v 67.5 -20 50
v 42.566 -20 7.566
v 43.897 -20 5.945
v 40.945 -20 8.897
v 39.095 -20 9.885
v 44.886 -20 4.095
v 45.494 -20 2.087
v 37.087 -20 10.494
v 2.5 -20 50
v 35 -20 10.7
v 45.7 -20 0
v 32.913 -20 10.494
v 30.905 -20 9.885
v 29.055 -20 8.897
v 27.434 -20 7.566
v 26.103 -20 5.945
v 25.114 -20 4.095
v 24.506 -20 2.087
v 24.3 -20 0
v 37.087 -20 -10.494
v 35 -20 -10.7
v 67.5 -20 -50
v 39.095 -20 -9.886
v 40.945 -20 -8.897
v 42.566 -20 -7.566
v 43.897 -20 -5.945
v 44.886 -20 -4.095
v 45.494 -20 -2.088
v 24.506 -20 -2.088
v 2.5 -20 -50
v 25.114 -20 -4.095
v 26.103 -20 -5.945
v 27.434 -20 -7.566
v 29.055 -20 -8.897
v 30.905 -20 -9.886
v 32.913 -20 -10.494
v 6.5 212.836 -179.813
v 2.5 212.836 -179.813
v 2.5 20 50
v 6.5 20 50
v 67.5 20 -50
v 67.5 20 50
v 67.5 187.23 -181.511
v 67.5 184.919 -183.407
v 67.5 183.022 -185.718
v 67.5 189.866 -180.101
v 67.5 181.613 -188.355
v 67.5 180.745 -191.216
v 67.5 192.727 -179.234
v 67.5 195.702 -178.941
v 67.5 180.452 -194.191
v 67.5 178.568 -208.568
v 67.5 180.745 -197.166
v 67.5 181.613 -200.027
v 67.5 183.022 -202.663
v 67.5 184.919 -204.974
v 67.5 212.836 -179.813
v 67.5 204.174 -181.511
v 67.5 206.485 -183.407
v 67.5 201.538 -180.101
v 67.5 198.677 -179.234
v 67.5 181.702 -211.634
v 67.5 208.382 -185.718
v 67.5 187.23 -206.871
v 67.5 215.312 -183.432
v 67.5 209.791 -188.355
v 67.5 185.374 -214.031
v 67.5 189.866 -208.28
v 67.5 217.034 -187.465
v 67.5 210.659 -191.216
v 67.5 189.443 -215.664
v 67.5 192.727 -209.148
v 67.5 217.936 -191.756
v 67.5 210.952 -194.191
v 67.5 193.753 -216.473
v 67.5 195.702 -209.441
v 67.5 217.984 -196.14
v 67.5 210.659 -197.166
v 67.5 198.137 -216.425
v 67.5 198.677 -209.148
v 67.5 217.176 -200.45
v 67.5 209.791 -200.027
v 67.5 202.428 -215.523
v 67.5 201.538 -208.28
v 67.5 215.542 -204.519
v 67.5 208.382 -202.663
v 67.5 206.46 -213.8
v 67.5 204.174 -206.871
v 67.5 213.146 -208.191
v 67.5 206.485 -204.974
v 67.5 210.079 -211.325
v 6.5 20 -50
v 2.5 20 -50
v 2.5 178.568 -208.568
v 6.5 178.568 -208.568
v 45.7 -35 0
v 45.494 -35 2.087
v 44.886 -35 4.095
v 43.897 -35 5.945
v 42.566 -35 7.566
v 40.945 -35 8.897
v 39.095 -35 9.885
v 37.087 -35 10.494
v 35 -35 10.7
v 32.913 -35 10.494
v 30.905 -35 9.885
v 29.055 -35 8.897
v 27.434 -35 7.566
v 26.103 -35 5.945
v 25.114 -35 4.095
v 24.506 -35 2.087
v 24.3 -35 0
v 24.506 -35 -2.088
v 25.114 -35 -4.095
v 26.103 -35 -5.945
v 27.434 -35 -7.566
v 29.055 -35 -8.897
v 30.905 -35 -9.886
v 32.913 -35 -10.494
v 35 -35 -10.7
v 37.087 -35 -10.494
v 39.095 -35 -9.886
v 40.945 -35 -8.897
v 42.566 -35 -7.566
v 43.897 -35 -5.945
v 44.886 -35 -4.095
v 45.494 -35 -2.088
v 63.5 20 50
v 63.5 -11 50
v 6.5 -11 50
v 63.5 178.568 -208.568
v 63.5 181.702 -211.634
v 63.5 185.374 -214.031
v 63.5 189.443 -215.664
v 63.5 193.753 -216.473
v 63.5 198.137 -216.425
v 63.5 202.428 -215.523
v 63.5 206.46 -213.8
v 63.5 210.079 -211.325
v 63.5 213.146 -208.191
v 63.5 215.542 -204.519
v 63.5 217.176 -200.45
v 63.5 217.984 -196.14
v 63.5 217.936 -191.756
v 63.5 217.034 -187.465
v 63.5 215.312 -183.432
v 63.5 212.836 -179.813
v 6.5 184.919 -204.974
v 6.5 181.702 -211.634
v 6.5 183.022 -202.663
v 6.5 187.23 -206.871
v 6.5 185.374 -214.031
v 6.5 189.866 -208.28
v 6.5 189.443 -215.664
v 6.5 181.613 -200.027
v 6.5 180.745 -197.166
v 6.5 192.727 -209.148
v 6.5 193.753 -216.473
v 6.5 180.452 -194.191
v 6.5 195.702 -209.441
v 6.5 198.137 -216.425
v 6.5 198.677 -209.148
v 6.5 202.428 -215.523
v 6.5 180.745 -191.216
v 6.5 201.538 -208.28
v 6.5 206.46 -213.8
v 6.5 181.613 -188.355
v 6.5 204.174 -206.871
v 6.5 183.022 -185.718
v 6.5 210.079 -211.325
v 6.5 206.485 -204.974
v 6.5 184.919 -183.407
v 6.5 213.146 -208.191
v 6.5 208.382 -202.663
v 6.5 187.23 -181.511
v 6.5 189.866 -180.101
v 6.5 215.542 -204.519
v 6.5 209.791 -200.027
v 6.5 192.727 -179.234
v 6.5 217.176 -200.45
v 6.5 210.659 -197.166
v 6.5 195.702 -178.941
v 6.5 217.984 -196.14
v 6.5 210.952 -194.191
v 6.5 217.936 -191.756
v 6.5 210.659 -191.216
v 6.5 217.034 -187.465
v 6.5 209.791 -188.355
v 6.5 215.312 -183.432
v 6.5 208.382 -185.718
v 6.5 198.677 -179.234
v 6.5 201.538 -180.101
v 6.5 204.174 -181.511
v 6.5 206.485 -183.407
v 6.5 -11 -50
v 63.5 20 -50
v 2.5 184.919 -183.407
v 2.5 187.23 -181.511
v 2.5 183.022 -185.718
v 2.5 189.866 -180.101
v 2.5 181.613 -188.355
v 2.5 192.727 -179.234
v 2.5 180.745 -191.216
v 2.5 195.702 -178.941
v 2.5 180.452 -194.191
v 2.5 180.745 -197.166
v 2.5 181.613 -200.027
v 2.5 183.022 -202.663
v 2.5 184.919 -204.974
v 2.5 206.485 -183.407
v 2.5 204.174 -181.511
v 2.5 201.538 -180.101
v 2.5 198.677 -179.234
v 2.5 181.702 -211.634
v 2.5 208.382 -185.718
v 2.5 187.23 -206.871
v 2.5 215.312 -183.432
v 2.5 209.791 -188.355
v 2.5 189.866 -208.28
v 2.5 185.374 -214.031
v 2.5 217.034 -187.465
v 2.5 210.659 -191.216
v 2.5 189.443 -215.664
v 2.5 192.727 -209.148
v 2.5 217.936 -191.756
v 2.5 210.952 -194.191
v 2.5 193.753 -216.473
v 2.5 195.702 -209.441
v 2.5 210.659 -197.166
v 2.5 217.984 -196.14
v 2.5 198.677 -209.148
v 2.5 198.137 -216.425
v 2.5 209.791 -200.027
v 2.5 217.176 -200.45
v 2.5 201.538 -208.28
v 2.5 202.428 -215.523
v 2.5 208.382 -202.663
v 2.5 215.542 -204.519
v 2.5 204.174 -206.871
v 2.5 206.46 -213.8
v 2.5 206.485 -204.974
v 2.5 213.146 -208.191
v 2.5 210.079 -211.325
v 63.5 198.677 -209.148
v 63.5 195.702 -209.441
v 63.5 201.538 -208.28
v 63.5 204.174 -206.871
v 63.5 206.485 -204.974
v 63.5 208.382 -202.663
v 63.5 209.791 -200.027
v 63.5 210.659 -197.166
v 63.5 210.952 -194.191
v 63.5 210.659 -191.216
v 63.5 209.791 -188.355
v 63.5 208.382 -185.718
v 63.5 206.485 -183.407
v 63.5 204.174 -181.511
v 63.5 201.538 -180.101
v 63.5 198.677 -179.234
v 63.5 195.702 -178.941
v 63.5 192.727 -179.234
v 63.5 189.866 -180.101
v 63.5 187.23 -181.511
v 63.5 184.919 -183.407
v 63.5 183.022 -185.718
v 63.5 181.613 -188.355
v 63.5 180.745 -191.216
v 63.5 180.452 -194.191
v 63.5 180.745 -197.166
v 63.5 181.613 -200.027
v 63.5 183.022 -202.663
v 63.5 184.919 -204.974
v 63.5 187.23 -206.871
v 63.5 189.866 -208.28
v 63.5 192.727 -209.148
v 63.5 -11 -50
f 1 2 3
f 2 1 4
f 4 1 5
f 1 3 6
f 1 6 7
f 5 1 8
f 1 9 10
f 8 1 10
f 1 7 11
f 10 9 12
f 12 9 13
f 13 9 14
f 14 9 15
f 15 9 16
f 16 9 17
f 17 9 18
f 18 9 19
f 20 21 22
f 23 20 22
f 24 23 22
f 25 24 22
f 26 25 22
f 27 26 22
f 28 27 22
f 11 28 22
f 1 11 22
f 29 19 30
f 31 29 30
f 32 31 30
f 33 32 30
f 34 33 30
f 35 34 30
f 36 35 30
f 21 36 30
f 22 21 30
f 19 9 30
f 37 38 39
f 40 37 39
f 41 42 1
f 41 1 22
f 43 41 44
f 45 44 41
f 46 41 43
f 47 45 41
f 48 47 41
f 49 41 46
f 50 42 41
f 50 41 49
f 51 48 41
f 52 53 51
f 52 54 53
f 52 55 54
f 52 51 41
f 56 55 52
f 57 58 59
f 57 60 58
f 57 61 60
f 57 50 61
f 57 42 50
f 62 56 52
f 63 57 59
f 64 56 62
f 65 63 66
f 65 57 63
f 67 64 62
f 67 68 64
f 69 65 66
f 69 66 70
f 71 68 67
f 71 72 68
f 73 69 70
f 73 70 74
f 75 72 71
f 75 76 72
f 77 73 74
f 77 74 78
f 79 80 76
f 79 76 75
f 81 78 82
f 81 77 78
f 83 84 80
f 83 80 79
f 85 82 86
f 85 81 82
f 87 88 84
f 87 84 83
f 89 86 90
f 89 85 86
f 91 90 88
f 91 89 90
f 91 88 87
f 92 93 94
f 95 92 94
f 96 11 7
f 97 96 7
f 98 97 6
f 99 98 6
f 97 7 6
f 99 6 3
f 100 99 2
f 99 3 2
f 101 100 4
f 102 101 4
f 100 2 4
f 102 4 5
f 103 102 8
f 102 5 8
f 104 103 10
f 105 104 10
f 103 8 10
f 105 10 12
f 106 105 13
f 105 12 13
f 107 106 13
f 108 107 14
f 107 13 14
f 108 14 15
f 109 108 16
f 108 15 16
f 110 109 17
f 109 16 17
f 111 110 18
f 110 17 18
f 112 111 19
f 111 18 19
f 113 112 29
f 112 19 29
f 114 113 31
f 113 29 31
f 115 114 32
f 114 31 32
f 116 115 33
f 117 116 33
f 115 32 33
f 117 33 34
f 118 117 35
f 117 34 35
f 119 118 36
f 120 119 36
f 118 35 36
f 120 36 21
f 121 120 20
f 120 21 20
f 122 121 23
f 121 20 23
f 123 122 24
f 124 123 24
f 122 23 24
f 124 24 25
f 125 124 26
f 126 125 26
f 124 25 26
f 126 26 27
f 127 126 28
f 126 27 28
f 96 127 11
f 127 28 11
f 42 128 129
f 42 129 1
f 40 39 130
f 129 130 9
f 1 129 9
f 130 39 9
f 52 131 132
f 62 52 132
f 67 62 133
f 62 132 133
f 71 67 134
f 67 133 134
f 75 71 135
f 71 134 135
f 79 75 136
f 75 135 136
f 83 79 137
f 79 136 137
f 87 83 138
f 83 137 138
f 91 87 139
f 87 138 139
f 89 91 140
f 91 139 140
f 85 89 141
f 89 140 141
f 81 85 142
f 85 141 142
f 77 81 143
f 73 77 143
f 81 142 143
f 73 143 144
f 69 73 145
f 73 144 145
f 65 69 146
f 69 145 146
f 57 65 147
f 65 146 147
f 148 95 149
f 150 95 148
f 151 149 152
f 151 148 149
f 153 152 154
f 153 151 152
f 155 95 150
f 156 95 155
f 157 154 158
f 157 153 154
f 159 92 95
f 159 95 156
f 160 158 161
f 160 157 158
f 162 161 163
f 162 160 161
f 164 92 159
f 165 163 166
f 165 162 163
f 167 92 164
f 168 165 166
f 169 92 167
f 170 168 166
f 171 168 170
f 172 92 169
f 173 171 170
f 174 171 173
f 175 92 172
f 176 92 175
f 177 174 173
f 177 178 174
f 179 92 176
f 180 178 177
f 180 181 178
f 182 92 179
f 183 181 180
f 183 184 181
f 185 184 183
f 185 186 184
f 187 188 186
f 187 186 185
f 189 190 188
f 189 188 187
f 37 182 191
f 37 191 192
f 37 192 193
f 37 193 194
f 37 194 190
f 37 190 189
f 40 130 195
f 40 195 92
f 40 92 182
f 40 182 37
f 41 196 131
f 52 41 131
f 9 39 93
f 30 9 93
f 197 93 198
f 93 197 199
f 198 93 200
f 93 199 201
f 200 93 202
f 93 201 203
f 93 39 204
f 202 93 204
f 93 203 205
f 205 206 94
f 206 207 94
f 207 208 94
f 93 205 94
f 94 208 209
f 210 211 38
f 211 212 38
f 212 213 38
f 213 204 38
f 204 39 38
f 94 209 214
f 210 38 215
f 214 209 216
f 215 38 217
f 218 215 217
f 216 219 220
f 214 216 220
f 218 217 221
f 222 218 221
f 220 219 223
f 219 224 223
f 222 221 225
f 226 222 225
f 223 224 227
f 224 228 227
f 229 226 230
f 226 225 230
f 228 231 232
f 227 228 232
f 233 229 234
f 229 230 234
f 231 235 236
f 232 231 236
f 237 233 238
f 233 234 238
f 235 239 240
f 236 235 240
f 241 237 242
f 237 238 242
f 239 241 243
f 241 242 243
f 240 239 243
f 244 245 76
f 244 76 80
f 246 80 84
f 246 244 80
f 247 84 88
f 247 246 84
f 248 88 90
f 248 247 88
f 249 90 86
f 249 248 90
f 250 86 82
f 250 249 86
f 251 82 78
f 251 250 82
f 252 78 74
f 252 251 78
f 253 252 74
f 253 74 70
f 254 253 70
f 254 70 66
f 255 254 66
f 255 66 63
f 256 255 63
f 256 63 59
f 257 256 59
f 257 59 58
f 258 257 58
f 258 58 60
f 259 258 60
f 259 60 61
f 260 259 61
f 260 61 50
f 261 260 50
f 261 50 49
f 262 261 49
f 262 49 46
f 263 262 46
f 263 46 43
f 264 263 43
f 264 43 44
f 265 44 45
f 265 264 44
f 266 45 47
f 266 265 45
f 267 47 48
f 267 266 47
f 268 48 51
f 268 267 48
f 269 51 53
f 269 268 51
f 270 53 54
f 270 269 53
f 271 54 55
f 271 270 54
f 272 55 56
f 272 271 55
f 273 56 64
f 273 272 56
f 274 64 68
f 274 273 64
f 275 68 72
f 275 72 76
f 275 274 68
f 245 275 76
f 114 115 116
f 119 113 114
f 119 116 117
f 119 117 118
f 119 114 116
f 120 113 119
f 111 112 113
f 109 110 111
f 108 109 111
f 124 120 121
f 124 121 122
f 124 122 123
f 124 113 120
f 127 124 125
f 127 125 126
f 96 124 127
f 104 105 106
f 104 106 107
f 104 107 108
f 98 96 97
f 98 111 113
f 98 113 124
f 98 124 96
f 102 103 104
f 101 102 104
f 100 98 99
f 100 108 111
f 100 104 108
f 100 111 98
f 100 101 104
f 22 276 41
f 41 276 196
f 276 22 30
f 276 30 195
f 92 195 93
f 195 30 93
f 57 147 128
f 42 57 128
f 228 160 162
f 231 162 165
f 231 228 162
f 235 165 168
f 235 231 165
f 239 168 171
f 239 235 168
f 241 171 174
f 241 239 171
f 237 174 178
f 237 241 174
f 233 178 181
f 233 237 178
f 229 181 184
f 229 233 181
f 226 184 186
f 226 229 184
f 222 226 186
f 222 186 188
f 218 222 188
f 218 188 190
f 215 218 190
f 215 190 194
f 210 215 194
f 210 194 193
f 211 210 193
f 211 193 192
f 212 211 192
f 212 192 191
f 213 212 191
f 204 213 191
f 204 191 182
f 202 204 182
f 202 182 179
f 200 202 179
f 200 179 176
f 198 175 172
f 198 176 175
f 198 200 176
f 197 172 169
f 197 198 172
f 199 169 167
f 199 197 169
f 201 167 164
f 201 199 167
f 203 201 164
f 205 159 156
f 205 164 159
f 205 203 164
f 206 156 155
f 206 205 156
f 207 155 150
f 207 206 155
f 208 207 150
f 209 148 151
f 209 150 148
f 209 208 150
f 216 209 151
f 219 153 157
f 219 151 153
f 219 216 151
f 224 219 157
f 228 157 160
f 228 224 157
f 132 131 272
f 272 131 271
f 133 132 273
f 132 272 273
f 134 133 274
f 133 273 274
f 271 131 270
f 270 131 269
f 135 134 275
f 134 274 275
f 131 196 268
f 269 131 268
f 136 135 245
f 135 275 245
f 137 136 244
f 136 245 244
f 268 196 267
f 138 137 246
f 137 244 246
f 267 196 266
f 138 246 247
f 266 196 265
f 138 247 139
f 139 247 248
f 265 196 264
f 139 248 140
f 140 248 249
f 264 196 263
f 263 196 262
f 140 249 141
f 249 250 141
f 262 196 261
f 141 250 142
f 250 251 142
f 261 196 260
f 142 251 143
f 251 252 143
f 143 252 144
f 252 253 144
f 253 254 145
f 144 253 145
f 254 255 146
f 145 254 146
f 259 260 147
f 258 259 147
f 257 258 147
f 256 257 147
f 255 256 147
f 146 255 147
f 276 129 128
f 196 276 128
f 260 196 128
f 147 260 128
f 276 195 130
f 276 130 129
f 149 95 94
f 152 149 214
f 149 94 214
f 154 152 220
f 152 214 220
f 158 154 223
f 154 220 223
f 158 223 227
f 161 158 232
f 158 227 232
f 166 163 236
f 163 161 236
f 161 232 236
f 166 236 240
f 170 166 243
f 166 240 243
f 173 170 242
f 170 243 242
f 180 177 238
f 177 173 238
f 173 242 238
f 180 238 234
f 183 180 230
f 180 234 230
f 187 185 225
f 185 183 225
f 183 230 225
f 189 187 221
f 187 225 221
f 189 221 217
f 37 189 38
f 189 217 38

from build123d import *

# Parameters (mm, degrees)
CROQUIS1_R              = 15.25
SALIENTE_EXTRUIR2_DEPTH = 70
CROQUIS3_W              = 57
CROQUIS3_H              = 229.06918818
CORTAR_EXTRUIR1_DEPTH   = 352.435861424
CROQUIS5_R              = 10.7
SALIENTE_EXTRUIR3_DEPTH = 15
CROQUIS1_2_R            = 15.25
CORTAR_EXTRUIR2_DEPTH   = 2.5
CORTAR_EXTRUIR3_START   = -2.5
CROQUIS7_R              = 15.25
CORTAR_EXTRUIR3_DEPTH   = 2.5


with BuildPart() as part:
    # Croquis1 → Saliente-Extruir2 (new body)
    with BuildSketch(Plane(origin=(0, 0, 0), x_dir=(0, 0, -1), z_dir=(1, 0, 0))):
        with BuildLine():
            Line((50.000039636, 19.999952763), (205.563531497, 175.563444624))
            Line((205.563531497, 175.563444624), (208.567950725, 178.567863852))
            ThreePointArc((208.567950725, 178.567863852), (211.324847557, 210.079338837), (179.813372572, 212.836235669))
            Line((179.813372572, 212.836235669), (-49.999960364, 19.999952763))
            Line((-49.999960364, 19.999952763), (-49.999960364, -20.000047237))
            Line((-49.999960364, -20.000047237), (50.000039636, -20.000047237))
            Line((50.000039636, -20.000047237), (50.000039636, 19.999952763))
        make_face()
        with Locations((194.190661648, 195.702049761)):
            Circle(CROQUIS1_R, mode=Mode.SUBTRACT)
    extrude(amount=SALIENTE_EXTRUIR2_DEPTH)

    # Croquis3 → Cortar-Extruir1 (cut, through all)
    with BuildSketch(Plane.XY.offset(49.999960364)):
        with Locations((35, 103.534546853)):
            Rectangle(CROQUIS3_W, CROQUIS3_H)
    extrude(amount=-CORTAR_EXTRUIR1_DEPTH, mode=Mode.SUBTRACT)

    # Croquis5 → Saliente-Extruir3 (add)
    with BuildSketch(Plane.XZ.offset(20.000047237)):
        with Locations((35, -3.9636e-05)):
            Circle(CROQUIS5_R)
    extrude(amount=SALIENTE_EXTRUIR3_DEPTH)

    # Croquis1<2> → Cortar-Extruir2 (cut)
    with BuildSketch(Plane(origin=(0, 0, 0), x_dir=(0, 0, -1), z_dir=(1, 0, 0))):
        with BuildLine():
            Line((50.000039636, 19.999952763), (205.563531497, 175.563444624))
            Line((205.563531497, 175.563444624), (208.567950725, 178.567863852))
            ThreePointArc((208.567950725, 178.567863852), (211.324847557, 210.079338837), (179.813372572, 212.836235669))
            Line((179.813372572, 212.836235669), (-49.999960364, 19.999952763))
            Line((-49.999960364, 19.999952763), (-49.999960364, -20.000047237))
            Line((-49.999960364, -20.000047237), (50.000039636, -20.000047237))
            Line((50.000039636, -20.000047237), (50.000039636, 19.999952763))
        make_face()
        with Locations((194.190661648, 195.702049761)):
            Circle(CROQUIS1_2_R, mode=Mode.SUBTRACT)
    extrude(amount=CORTAR_EXTRUIR2_DEPTH, mode=Mode.SUBTRACT)

    # Croquis7 → Cortar-Extruir3 (cut)
    with BuildSketch(Plane(origin=(70, 0, 0), x_dir=(0, 0, -1), z_dir=(1, 0, 0)).offset(CORTAR_EXTRUIR3_START)):
        with BuildLine():
            Line((179.813372572, 212.836235669), (-49.999960364, 19.999952763))
            Line((-49.999960364, 19.999952763), (-49.999960364, -20.000047237))
            Line((-49.999960364, -20.000047237), (50.000039636, -20.000047237))
            Line((50.000039636, -20.000047237), (50.000039636, 19.999952763))
            Line((50.000039636, 19.999952763), (208.567950725, 178.567863852))
            ThreePointArc((208.567950725, 178.567863852), (211.324847557, 210.079338837), (179.813372572, 212.836235669))
        make_face()
        with Locations((194.190661648, 195.702049761)):
            Circle(CROQUIS7_R, mode=Mode.SUBTRACT)
    extrude(amount=CORTAR_EXTRUIR3_DEPTH, mode=Mode.SUBTRACT)


solid = part.part
